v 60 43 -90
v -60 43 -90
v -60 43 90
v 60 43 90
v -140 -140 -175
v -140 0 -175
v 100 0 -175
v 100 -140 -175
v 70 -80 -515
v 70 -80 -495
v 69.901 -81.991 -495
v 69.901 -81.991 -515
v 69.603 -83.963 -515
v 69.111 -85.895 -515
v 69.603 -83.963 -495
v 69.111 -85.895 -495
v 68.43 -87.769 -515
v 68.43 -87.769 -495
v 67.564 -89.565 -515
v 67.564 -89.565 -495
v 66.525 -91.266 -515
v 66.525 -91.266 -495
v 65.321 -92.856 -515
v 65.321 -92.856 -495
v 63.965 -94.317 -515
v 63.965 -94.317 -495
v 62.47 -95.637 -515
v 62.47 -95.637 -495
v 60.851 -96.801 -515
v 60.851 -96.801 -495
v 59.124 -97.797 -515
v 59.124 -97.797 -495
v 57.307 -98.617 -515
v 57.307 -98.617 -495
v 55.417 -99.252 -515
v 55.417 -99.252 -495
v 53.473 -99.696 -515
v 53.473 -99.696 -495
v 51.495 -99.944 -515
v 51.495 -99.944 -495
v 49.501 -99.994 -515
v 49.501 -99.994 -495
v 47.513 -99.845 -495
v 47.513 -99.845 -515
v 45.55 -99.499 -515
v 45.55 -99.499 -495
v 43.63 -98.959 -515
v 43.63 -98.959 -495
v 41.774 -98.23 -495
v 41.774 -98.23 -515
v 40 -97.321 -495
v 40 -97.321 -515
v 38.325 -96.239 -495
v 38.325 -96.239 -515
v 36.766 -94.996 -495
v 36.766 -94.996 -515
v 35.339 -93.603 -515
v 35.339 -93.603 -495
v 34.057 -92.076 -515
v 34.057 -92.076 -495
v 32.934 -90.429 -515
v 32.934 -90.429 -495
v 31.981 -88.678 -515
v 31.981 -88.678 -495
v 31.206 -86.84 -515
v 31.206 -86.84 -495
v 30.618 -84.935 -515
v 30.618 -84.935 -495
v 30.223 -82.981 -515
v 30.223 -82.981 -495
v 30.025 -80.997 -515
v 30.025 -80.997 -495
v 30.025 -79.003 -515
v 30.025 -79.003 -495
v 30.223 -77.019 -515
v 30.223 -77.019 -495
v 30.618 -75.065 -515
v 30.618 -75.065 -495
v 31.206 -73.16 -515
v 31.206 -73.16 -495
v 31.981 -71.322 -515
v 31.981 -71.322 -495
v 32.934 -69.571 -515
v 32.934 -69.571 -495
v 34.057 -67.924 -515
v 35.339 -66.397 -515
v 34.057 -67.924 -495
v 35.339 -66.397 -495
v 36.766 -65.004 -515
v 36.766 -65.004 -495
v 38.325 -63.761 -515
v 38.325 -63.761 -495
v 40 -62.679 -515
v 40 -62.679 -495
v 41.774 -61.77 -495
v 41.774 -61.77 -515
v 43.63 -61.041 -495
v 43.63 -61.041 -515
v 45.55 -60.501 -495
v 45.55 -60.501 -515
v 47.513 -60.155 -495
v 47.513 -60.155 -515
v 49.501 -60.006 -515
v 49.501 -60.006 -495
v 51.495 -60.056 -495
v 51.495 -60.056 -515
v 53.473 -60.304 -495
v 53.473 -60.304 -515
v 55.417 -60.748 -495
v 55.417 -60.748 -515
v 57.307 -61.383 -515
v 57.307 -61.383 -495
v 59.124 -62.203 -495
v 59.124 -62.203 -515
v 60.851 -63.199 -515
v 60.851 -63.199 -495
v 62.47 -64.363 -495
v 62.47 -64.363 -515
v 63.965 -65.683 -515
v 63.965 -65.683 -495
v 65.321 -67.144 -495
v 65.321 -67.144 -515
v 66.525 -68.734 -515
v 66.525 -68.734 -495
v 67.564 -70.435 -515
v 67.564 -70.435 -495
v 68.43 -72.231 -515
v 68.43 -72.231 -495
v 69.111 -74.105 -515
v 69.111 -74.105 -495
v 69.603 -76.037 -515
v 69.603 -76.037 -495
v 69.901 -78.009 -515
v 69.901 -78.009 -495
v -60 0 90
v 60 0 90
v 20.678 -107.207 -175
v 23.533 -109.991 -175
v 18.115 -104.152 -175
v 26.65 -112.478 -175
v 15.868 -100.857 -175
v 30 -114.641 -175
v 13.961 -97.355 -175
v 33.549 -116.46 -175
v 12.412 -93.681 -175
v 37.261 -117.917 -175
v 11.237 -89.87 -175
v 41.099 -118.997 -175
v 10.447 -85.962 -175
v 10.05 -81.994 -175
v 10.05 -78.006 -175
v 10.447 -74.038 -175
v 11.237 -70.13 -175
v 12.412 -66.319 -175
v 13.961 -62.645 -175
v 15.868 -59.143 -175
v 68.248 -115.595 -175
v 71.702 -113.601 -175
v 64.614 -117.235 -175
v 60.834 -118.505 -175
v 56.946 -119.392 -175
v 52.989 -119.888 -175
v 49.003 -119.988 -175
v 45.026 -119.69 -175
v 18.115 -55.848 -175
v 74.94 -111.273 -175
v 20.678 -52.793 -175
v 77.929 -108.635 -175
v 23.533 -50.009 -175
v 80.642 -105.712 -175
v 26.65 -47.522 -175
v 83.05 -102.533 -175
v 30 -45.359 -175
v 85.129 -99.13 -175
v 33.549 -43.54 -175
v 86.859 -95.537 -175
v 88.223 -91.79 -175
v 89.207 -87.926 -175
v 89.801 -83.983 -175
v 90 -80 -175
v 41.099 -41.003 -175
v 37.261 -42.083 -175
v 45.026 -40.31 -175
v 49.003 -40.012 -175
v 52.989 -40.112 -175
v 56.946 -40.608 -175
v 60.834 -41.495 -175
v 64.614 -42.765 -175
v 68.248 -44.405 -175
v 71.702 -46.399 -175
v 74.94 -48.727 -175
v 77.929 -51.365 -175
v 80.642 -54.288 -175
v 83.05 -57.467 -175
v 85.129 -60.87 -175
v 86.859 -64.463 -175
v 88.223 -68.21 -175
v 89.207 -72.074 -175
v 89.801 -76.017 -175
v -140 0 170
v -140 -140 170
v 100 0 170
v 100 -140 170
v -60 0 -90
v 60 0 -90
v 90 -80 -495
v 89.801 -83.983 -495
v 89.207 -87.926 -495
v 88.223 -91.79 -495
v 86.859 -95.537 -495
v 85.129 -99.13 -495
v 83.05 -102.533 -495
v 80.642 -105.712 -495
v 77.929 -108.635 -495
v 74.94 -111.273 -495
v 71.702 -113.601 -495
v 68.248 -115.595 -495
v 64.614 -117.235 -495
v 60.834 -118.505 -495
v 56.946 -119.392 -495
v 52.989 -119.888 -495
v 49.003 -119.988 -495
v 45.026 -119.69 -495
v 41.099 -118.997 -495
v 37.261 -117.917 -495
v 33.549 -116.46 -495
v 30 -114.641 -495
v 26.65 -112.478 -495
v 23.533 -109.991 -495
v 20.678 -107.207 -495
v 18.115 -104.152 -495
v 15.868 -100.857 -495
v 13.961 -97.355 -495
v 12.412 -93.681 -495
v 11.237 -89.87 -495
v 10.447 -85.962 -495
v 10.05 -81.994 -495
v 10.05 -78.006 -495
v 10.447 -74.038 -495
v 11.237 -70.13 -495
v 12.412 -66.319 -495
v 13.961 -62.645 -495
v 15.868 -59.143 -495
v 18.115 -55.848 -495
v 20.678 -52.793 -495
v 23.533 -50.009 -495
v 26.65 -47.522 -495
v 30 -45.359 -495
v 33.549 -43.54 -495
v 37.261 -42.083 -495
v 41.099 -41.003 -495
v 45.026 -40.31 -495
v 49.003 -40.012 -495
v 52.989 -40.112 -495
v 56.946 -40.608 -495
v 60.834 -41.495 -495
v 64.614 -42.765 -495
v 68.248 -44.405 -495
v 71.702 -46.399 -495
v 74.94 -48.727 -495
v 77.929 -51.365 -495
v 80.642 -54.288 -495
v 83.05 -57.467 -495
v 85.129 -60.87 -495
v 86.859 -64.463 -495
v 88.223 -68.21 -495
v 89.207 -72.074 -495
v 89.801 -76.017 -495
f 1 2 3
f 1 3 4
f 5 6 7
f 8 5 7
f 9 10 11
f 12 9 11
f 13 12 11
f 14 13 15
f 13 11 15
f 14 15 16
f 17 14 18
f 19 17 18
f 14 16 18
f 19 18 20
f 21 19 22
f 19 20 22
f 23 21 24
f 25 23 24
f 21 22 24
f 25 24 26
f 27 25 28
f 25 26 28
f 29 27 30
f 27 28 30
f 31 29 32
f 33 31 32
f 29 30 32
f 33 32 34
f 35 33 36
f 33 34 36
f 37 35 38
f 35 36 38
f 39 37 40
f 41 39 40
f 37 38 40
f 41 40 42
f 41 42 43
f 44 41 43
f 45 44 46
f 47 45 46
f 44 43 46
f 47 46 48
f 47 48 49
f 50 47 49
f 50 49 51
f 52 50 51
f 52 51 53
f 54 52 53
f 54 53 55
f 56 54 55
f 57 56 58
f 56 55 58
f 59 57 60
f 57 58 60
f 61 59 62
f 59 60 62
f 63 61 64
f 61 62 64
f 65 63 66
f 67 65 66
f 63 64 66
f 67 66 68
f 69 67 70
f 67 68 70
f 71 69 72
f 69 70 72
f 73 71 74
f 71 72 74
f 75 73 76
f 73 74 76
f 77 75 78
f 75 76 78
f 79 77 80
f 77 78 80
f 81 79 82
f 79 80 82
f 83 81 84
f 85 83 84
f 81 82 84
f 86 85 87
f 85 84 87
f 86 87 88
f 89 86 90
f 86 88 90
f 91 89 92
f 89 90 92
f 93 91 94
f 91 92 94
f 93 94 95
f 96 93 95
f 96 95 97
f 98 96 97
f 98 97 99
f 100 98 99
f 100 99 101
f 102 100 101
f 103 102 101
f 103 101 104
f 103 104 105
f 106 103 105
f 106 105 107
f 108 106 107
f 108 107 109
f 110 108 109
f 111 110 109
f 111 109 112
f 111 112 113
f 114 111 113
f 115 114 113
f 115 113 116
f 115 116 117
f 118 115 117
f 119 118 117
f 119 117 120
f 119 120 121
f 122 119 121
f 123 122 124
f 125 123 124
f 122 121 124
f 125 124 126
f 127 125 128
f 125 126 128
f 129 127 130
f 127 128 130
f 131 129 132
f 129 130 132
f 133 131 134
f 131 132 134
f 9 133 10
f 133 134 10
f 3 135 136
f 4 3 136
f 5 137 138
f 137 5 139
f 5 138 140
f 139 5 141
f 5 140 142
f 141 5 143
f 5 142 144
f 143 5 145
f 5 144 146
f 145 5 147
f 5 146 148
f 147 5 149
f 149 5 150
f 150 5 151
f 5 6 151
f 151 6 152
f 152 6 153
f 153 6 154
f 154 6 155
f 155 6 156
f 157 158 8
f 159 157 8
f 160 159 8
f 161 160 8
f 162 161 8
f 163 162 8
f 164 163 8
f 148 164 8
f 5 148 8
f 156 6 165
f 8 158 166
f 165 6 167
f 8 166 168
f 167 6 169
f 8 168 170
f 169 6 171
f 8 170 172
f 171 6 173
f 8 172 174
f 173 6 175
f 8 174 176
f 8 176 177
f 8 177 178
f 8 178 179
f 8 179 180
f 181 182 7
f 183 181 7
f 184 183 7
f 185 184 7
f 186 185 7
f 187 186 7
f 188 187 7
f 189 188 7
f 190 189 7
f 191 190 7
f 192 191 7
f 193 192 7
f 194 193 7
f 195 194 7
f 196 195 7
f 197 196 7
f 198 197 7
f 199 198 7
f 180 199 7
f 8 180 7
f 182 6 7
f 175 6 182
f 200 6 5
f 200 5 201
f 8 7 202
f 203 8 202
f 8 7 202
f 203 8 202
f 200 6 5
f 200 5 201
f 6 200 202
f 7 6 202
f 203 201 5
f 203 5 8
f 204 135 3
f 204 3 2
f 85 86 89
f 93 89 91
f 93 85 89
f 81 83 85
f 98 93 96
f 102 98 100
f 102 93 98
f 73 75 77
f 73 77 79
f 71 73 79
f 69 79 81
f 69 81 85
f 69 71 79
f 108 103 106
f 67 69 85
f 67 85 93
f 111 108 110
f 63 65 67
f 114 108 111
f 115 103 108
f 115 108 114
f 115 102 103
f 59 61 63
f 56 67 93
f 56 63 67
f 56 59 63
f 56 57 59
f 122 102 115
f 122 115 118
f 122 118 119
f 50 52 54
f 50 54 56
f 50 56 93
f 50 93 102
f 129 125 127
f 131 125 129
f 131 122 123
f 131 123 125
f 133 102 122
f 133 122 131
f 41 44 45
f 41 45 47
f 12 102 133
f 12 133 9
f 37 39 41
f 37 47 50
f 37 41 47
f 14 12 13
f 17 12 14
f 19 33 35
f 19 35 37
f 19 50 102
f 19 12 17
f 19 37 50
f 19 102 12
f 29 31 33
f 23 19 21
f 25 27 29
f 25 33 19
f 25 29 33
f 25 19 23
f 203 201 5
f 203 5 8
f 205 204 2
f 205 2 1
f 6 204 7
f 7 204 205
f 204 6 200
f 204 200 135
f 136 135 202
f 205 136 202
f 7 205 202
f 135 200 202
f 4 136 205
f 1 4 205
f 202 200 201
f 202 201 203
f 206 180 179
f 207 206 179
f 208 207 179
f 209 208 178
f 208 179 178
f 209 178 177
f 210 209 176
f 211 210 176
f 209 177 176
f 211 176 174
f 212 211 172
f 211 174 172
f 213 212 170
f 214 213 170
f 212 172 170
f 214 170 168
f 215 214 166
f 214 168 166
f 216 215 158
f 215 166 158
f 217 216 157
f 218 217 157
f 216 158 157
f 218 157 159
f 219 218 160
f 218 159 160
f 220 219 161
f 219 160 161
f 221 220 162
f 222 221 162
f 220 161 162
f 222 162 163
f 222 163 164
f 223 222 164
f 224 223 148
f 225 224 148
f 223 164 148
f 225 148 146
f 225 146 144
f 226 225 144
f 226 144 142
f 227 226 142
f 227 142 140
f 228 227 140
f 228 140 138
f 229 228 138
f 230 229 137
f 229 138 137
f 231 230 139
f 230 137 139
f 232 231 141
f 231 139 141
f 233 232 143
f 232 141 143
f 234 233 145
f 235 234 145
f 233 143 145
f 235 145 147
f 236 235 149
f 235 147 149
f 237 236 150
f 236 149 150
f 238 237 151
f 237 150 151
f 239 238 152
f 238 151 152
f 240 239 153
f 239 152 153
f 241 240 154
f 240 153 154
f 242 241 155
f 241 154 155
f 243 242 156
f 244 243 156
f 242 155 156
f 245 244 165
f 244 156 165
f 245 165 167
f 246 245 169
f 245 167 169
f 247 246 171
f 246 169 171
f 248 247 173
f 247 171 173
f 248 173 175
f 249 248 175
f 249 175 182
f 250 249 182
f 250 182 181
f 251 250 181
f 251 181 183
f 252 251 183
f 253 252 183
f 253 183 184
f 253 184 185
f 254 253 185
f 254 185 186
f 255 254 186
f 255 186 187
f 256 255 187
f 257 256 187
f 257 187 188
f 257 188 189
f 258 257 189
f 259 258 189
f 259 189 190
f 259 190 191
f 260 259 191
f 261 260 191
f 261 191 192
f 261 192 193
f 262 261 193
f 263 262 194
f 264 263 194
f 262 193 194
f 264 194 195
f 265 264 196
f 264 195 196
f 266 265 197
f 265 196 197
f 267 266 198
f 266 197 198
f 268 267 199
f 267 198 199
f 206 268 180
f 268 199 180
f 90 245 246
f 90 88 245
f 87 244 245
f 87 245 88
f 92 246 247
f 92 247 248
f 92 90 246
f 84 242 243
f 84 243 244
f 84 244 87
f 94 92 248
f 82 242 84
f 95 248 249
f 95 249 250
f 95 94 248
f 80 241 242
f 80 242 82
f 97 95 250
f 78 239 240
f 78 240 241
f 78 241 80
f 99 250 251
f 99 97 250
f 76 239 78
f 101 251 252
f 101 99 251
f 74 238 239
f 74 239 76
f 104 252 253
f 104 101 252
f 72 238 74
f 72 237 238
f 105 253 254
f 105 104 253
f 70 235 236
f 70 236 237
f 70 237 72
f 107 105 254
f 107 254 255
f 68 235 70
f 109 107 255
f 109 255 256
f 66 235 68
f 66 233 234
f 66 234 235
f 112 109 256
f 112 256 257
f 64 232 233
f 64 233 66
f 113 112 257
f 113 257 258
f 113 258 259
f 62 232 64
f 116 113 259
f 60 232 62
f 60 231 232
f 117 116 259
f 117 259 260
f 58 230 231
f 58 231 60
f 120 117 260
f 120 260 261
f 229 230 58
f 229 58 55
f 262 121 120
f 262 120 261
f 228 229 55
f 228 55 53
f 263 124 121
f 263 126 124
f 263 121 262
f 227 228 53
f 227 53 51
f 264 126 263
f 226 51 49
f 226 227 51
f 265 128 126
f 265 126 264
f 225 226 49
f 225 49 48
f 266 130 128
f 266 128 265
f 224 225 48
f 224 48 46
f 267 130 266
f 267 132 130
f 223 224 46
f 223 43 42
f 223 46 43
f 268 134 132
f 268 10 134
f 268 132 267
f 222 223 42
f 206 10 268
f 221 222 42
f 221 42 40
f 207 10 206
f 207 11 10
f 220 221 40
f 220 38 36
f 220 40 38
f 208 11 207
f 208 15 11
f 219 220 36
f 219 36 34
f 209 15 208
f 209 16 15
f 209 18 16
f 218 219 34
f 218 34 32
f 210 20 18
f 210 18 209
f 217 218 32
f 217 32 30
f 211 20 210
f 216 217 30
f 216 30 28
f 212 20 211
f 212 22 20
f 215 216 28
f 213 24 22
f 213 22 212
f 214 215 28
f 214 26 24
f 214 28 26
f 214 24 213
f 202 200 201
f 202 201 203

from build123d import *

# Parameters (mm, degrees)
SKETCH_W     = 240
SKETCH_H     = 345
PAD_DEPTH    = 140
SKETCH001_W  = 120
SKETCH001_H  = 180
PAD001_DEPTH = 43
SKETCH002_R  = 40
PAD002_DEPTH = 320
SKETCH003_R  = 20
PAD003_DEPTH = 20


with BuildPart() as pad:
    # Sketch → Pad (new body)
    with BuildSketch(Plane.XZ):
        with Locations((-20, -2.5)):
            Rectangle(SKETCH_W, SKETCH_H)
    extrude(amount=PAD_DEPTH)


with BuildPart() as pad001:
    # Pad001 base: copy of Pad
    add(pad.part)

    # Sketch001 → Pad001 (new body)
    with BuildSketch(Plane(origin=(0, 0, 0), x_dir=(1, 0, 0), z_dir=(0, 1, 0))):
        Rectangle(SKETCH001_W, SKETCH001_H)
    extrude(amount=PAD001_DEPTH)


with BuildPart() as pad003:
    # Pad002 base: copy of Pad
    add(pad.part)

    # Sketch002 → Pad002 (new body)
    with BuildSketch(Plane(origin=(0, 0, -175), x_dir=(1, 0, 0), z_dir=(0, 0, -1))):
        with Locations((50, 80)):
            Circle(SKETCH002_R)
    extrude(amount=PAD002_DEPTH)

    # Sketch003 → Pad003 (new body)
    with BuildSketch(Plane(origin=(0, 0, -495), x_dir=(1, 0, 0), z_dir=(0, 0, -1))):
        with Locations((50, 80)):
            Circle(SKETCH003_R)
    extrude(amount=PAD003_DEPTH)


solid = Compound([pad001.part, pad003.part])
